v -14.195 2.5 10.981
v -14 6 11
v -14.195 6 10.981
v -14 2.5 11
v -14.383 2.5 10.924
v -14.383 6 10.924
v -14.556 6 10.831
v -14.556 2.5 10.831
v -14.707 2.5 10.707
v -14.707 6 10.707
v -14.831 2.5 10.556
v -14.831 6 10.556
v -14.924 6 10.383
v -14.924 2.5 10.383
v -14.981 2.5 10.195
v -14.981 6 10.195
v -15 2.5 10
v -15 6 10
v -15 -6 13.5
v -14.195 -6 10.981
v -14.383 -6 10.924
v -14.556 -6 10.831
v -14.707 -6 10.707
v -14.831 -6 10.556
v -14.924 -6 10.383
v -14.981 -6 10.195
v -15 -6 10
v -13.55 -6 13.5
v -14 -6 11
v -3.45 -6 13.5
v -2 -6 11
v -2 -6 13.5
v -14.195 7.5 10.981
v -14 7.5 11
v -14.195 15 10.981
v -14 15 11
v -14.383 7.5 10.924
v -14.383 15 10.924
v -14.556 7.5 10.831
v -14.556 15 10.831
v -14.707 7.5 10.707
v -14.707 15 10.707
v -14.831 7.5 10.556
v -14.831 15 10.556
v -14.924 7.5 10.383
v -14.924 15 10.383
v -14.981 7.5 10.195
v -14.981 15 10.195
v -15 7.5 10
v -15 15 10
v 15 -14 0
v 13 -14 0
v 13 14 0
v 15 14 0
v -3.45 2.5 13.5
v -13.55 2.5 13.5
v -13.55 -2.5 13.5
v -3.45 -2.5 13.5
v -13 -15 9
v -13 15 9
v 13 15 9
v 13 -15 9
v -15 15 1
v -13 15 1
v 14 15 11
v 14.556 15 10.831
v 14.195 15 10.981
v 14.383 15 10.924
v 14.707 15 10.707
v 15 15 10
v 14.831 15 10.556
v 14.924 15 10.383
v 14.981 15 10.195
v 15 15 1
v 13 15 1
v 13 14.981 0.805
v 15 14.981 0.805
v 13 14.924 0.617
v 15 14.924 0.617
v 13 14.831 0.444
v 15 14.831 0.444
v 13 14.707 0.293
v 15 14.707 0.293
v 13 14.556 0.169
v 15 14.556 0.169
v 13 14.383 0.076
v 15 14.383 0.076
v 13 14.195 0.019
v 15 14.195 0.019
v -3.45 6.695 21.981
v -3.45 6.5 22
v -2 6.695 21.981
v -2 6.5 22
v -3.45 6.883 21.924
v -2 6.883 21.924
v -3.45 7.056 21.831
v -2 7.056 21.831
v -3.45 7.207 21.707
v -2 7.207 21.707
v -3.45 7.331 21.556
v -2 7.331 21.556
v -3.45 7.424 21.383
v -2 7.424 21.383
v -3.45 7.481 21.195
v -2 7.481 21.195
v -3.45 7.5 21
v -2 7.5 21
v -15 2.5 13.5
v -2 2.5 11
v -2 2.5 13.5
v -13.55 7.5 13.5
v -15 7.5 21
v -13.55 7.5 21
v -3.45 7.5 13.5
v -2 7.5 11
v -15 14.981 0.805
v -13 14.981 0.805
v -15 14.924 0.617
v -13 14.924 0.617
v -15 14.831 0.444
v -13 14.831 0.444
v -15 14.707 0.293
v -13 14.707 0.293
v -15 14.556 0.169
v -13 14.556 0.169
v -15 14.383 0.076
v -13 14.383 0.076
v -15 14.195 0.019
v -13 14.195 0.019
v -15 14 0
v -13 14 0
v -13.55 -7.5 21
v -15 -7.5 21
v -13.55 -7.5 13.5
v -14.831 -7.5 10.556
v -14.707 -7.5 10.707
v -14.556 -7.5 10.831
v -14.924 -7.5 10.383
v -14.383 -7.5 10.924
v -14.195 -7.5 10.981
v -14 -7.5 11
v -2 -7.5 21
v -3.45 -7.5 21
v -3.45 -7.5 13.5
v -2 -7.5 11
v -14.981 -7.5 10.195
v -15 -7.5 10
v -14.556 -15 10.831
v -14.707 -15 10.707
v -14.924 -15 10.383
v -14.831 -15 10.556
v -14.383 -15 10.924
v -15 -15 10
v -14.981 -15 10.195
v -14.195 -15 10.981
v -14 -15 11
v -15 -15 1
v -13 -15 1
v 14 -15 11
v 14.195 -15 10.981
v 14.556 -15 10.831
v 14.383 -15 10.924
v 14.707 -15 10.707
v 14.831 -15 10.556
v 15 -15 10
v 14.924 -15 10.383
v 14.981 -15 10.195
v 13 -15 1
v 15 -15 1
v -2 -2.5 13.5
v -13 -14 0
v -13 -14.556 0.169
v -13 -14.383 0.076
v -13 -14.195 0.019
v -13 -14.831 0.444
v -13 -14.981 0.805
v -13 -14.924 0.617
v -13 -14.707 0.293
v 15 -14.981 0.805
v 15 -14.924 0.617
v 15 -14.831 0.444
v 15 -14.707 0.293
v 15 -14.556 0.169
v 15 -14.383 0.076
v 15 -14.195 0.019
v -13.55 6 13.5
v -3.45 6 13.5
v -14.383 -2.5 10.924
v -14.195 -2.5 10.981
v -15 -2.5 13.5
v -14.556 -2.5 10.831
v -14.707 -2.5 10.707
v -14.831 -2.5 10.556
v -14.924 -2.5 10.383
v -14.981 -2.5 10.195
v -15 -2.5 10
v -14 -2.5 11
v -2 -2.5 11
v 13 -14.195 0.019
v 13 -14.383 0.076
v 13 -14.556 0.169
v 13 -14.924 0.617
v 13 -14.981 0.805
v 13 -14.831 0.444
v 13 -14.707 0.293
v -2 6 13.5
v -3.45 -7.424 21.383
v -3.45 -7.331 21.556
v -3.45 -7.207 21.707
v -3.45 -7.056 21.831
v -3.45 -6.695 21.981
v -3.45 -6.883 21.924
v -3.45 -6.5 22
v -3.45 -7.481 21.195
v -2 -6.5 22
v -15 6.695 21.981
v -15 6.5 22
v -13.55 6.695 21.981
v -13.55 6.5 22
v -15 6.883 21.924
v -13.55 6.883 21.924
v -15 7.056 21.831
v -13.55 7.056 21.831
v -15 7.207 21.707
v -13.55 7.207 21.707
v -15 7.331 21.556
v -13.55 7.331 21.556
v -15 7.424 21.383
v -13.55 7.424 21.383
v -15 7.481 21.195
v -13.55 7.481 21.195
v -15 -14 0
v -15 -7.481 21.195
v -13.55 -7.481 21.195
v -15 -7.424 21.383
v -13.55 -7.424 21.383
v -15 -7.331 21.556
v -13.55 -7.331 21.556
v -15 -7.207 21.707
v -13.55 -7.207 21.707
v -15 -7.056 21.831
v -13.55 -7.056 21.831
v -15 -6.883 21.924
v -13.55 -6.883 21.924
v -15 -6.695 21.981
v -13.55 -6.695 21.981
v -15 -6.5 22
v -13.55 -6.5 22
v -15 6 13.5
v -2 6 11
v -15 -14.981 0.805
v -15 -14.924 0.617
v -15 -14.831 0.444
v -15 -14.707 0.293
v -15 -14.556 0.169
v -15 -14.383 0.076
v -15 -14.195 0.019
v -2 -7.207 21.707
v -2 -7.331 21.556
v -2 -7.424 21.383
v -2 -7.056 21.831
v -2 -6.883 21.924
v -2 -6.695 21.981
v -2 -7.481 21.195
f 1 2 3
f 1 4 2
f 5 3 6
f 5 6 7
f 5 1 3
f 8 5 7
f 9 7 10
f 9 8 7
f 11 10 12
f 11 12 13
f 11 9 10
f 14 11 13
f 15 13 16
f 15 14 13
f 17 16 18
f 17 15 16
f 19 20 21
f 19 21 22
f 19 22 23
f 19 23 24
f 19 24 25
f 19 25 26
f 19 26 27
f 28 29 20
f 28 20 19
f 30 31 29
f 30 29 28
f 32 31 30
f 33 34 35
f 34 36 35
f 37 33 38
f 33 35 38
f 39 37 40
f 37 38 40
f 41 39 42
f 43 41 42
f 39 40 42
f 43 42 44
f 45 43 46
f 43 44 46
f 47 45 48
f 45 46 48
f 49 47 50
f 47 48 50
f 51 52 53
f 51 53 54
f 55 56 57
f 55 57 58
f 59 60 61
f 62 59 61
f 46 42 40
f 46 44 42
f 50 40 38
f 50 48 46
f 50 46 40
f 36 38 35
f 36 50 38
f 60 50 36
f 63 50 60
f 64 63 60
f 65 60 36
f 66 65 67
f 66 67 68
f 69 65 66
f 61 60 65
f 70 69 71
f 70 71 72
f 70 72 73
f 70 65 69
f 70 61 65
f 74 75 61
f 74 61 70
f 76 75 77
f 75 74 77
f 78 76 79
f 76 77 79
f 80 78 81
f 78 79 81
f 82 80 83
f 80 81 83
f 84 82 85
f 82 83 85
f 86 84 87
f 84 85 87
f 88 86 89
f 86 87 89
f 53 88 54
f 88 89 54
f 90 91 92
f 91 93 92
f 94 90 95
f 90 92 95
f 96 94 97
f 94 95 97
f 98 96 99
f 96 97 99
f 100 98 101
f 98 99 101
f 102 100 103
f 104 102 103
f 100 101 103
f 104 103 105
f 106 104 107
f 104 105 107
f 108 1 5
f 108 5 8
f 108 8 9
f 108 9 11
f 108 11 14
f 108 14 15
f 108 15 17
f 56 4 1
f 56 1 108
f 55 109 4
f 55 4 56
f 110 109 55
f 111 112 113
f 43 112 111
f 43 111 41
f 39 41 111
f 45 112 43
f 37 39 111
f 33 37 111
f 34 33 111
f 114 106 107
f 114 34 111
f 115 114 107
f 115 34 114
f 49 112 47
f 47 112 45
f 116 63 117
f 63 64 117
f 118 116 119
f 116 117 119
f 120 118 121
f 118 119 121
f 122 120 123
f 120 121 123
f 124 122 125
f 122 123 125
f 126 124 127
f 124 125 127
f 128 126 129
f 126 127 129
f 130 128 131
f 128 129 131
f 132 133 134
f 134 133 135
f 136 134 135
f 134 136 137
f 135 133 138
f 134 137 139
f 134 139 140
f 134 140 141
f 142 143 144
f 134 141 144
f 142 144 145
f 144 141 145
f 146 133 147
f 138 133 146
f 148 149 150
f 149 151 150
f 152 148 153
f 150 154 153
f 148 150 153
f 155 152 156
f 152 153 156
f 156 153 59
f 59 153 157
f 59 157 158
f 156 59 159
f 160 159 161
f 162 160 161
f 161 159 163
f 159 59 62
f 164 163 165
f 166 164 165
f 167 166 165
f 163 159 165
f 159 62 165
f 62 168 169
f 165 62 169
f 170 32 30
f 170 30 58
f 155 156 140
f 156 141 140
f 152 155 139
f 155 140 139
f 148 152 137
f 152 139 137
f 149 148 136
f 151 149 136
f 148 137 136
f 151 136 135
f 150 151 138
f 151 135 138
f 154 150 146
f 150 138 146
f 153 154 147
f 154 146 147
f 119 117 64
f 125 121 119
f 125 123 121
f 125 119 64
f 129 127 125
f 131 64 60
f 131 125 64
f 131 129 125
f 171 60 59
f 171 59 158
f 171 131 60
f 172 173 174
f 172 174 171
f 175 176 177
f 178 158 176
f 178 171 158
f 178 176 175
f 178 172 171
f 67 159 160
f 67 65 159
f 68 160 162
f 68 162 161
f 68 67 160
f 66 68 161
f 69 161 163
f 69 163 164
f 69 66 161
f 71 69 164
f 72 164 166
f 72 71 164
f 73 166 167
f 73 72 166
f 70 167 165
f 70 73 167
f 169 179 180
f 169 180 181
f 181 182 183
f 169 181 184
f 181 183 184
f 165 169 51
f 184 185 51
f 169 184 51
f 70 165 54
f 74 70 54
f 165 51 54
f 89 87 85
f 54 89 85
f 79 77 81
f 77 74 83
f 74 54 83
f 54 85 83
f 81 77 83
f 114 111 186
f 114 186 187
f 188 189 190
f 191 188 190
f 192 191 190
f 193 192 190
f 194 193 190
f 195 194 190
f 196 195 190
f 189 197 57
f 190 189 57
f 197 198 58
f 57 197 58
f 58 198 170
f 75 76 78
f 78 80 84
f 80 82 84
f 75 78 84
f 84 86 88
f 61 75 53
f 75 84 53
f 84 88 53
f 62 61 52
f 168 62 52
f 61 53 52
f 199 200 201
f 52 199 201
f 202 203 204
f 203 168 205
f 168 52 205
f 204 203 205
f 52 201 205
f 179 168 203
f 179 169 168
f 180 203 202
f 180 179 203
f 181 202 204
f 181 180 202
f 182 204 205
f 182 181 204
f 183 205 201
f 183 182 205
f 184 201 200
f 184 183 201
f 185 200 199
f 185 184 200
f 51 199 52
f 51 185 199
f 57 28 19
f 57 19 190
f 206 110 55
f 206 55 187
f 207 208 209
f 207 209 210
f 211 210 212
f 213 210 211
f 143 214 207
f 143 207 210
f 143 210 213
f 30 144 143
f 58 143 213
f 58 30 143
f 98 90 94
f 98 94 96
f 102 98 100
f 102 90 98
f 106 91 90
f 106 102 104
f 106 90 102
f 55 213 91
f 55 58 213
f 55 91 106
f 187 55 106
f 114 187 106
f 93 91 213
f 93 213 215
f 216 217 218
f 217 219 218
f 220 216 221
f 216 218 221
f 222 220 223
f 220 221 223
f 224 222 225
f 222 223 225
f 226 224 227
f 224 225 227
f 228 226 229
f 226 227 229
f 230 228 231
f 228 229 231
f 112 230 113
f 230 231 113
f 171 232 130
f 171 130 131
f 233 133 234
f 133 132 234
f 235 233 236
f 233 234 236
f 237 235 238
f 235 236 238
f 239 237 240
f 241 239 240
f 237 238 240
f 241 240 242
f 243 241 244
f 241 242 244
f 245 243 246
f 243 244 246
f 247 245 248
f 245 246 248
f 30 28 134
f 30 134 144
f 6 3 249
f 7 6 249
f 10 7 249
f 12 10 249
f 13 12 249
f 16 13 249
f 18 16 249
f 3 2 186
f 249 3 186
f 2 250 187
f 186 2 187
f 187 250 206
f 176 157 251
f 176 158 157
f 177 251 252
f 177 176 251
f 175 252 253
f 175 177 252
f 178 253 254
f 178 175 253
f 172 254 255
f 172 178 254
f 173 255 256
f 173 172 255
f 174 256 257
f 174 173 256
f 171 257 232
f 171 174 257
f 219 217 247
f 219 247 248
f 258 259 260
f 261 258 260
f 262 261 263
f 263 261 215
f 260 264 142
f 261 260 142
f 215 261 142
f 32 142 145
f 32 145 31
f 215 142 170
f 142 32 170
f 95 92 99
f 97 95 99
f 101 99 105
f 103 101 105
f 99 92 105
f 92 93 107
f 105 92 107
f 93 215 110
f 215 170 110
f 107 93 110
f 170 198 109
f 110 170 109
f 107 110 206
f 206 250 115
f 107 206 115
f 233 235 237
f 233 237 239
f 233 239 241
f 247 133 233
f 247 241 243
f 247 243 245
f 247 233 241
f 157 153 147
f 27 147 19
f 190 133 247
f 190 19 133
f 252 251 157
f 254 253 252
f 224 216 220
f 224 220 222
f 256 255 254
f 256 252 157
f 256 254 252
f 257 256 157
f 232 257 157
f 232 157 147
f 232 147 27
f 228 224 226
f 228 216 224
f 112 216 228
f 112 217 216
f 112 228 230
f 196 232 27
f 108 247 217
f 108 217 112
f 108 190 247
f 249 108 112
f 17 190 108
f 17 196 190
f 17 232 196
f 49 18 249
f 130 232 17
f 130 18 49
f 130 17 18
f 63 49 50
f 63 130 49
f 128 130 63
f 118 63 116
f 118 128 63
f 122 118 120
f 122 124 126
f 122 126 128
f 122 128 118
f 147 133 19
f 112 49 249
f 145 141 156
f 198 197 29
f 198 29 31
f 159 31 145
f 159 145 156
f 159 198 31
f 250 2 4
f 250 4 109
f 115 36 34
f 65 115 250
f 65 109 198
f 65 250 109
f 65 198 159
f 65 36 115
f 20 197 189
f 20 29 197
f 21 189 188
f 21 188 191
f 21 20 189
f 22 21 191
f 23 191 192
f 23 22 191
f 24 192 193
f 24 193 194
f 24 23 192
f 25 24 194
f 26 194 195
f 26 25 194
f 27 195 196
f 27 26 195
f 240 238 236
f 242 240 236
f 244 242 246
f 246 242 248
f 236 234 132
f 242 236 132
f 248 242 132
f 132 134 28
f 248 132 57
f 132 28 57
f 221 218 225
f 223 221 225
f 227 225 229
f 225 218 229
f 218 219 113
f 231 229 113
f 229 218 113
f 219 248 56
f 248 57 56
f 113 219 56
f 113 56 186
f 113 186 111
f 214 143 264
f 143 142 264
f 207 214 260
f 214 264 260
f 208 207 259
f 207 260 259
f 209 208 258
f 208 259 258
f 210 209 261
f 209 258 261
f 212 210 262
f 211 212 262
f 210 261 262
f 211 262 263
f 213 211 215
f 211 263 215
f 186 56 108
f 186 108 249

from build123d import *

# Parameters (mm, degrees)
F0_W     = 30
F0_H     = 30
F1_DEPTH = 11
F2_W     = 26
F2_H     = 30
F3_DEPTH = 9
F4_W     = 1.45
F4_H     = 15
F5_DEPTH = 11
F6_W     = 10.1
F6_H     = 15
F7_DEPTH = 2.5
F8_W     = 3.5
F8_H     = 2.5
F9_DEPTH = 13.001
F10_R    = 1


with BuildPart() as f1:
    # F0 (on Top) → F1 (new body)
    with BuildSketch(Plane.XY):
        Rectangle(F0_W, F0_H)
    extrude(amount=F1_DEPTH)

    # F2 (on face) → F3 (cut)
    with BuildSketch(Plane(origin=(0, 0, 0), x_dir=(1, 0, 0), z_dir=(0, 0, -1))):
        Rectangle(F2_W, F2_H)
    extrude(amount=-F3_DEPTH, mode=Mode.SUBTRACT)

    # F4 (on face) → F5 (join)
    with BuildSketch(Plane.XY.offset(11)):
        with Locations((-14.275, 0)):
            Rectangle(F4_W, F4_H)
        with Locations((-2.725, 0)):
            Rectangle(F4_W, F4_H)
    extrude(amount=F5_DEPTH)

    # F6 (on face) → F7 (join)
    with BuildSketch(Plane.XY.offset(11)):
        with Locations((-8.5, 0)):
            Rectangle(F6_W, F6_H)
    extrude(amount=F7_DEPTH)

    # F8 (on face) → F9 (cut, through all)
    with BuildSketch(Plane.YZ.offset(-2)):
        with Locations((-4.25, 12.25)):
            Rectangle(F8_W, F8_H)
        with Locations((4.25, 12.25)):
            Rectangle(F8_W, F8_H)
    extrude(amount=-F9_DEPTH, mode=Mode.SUBTRACT)

    # F10
    f10_edges = [f1.edges().sort_by_distance(p)[0] for p in [
        (-14.275, 7.5, 22),
        (-14.275, -7.5, 22),
        (-2.725, -7.5, 22),
        (-2.725, 7.5, 22),
        (-15, -11.25, 11),
        (-15, 11.25, 11),
        (-15, 4.25, 11),
        (-15, -4.25, 11),
        (15, 0, 11),
        (-14, -15, 0),
        (14, -15, 0),
        (-14, 15, 0),
        (14, 15, 0),
    ]]
    fillet(f10_edges, radius=F10_R)


solid = f1.part
